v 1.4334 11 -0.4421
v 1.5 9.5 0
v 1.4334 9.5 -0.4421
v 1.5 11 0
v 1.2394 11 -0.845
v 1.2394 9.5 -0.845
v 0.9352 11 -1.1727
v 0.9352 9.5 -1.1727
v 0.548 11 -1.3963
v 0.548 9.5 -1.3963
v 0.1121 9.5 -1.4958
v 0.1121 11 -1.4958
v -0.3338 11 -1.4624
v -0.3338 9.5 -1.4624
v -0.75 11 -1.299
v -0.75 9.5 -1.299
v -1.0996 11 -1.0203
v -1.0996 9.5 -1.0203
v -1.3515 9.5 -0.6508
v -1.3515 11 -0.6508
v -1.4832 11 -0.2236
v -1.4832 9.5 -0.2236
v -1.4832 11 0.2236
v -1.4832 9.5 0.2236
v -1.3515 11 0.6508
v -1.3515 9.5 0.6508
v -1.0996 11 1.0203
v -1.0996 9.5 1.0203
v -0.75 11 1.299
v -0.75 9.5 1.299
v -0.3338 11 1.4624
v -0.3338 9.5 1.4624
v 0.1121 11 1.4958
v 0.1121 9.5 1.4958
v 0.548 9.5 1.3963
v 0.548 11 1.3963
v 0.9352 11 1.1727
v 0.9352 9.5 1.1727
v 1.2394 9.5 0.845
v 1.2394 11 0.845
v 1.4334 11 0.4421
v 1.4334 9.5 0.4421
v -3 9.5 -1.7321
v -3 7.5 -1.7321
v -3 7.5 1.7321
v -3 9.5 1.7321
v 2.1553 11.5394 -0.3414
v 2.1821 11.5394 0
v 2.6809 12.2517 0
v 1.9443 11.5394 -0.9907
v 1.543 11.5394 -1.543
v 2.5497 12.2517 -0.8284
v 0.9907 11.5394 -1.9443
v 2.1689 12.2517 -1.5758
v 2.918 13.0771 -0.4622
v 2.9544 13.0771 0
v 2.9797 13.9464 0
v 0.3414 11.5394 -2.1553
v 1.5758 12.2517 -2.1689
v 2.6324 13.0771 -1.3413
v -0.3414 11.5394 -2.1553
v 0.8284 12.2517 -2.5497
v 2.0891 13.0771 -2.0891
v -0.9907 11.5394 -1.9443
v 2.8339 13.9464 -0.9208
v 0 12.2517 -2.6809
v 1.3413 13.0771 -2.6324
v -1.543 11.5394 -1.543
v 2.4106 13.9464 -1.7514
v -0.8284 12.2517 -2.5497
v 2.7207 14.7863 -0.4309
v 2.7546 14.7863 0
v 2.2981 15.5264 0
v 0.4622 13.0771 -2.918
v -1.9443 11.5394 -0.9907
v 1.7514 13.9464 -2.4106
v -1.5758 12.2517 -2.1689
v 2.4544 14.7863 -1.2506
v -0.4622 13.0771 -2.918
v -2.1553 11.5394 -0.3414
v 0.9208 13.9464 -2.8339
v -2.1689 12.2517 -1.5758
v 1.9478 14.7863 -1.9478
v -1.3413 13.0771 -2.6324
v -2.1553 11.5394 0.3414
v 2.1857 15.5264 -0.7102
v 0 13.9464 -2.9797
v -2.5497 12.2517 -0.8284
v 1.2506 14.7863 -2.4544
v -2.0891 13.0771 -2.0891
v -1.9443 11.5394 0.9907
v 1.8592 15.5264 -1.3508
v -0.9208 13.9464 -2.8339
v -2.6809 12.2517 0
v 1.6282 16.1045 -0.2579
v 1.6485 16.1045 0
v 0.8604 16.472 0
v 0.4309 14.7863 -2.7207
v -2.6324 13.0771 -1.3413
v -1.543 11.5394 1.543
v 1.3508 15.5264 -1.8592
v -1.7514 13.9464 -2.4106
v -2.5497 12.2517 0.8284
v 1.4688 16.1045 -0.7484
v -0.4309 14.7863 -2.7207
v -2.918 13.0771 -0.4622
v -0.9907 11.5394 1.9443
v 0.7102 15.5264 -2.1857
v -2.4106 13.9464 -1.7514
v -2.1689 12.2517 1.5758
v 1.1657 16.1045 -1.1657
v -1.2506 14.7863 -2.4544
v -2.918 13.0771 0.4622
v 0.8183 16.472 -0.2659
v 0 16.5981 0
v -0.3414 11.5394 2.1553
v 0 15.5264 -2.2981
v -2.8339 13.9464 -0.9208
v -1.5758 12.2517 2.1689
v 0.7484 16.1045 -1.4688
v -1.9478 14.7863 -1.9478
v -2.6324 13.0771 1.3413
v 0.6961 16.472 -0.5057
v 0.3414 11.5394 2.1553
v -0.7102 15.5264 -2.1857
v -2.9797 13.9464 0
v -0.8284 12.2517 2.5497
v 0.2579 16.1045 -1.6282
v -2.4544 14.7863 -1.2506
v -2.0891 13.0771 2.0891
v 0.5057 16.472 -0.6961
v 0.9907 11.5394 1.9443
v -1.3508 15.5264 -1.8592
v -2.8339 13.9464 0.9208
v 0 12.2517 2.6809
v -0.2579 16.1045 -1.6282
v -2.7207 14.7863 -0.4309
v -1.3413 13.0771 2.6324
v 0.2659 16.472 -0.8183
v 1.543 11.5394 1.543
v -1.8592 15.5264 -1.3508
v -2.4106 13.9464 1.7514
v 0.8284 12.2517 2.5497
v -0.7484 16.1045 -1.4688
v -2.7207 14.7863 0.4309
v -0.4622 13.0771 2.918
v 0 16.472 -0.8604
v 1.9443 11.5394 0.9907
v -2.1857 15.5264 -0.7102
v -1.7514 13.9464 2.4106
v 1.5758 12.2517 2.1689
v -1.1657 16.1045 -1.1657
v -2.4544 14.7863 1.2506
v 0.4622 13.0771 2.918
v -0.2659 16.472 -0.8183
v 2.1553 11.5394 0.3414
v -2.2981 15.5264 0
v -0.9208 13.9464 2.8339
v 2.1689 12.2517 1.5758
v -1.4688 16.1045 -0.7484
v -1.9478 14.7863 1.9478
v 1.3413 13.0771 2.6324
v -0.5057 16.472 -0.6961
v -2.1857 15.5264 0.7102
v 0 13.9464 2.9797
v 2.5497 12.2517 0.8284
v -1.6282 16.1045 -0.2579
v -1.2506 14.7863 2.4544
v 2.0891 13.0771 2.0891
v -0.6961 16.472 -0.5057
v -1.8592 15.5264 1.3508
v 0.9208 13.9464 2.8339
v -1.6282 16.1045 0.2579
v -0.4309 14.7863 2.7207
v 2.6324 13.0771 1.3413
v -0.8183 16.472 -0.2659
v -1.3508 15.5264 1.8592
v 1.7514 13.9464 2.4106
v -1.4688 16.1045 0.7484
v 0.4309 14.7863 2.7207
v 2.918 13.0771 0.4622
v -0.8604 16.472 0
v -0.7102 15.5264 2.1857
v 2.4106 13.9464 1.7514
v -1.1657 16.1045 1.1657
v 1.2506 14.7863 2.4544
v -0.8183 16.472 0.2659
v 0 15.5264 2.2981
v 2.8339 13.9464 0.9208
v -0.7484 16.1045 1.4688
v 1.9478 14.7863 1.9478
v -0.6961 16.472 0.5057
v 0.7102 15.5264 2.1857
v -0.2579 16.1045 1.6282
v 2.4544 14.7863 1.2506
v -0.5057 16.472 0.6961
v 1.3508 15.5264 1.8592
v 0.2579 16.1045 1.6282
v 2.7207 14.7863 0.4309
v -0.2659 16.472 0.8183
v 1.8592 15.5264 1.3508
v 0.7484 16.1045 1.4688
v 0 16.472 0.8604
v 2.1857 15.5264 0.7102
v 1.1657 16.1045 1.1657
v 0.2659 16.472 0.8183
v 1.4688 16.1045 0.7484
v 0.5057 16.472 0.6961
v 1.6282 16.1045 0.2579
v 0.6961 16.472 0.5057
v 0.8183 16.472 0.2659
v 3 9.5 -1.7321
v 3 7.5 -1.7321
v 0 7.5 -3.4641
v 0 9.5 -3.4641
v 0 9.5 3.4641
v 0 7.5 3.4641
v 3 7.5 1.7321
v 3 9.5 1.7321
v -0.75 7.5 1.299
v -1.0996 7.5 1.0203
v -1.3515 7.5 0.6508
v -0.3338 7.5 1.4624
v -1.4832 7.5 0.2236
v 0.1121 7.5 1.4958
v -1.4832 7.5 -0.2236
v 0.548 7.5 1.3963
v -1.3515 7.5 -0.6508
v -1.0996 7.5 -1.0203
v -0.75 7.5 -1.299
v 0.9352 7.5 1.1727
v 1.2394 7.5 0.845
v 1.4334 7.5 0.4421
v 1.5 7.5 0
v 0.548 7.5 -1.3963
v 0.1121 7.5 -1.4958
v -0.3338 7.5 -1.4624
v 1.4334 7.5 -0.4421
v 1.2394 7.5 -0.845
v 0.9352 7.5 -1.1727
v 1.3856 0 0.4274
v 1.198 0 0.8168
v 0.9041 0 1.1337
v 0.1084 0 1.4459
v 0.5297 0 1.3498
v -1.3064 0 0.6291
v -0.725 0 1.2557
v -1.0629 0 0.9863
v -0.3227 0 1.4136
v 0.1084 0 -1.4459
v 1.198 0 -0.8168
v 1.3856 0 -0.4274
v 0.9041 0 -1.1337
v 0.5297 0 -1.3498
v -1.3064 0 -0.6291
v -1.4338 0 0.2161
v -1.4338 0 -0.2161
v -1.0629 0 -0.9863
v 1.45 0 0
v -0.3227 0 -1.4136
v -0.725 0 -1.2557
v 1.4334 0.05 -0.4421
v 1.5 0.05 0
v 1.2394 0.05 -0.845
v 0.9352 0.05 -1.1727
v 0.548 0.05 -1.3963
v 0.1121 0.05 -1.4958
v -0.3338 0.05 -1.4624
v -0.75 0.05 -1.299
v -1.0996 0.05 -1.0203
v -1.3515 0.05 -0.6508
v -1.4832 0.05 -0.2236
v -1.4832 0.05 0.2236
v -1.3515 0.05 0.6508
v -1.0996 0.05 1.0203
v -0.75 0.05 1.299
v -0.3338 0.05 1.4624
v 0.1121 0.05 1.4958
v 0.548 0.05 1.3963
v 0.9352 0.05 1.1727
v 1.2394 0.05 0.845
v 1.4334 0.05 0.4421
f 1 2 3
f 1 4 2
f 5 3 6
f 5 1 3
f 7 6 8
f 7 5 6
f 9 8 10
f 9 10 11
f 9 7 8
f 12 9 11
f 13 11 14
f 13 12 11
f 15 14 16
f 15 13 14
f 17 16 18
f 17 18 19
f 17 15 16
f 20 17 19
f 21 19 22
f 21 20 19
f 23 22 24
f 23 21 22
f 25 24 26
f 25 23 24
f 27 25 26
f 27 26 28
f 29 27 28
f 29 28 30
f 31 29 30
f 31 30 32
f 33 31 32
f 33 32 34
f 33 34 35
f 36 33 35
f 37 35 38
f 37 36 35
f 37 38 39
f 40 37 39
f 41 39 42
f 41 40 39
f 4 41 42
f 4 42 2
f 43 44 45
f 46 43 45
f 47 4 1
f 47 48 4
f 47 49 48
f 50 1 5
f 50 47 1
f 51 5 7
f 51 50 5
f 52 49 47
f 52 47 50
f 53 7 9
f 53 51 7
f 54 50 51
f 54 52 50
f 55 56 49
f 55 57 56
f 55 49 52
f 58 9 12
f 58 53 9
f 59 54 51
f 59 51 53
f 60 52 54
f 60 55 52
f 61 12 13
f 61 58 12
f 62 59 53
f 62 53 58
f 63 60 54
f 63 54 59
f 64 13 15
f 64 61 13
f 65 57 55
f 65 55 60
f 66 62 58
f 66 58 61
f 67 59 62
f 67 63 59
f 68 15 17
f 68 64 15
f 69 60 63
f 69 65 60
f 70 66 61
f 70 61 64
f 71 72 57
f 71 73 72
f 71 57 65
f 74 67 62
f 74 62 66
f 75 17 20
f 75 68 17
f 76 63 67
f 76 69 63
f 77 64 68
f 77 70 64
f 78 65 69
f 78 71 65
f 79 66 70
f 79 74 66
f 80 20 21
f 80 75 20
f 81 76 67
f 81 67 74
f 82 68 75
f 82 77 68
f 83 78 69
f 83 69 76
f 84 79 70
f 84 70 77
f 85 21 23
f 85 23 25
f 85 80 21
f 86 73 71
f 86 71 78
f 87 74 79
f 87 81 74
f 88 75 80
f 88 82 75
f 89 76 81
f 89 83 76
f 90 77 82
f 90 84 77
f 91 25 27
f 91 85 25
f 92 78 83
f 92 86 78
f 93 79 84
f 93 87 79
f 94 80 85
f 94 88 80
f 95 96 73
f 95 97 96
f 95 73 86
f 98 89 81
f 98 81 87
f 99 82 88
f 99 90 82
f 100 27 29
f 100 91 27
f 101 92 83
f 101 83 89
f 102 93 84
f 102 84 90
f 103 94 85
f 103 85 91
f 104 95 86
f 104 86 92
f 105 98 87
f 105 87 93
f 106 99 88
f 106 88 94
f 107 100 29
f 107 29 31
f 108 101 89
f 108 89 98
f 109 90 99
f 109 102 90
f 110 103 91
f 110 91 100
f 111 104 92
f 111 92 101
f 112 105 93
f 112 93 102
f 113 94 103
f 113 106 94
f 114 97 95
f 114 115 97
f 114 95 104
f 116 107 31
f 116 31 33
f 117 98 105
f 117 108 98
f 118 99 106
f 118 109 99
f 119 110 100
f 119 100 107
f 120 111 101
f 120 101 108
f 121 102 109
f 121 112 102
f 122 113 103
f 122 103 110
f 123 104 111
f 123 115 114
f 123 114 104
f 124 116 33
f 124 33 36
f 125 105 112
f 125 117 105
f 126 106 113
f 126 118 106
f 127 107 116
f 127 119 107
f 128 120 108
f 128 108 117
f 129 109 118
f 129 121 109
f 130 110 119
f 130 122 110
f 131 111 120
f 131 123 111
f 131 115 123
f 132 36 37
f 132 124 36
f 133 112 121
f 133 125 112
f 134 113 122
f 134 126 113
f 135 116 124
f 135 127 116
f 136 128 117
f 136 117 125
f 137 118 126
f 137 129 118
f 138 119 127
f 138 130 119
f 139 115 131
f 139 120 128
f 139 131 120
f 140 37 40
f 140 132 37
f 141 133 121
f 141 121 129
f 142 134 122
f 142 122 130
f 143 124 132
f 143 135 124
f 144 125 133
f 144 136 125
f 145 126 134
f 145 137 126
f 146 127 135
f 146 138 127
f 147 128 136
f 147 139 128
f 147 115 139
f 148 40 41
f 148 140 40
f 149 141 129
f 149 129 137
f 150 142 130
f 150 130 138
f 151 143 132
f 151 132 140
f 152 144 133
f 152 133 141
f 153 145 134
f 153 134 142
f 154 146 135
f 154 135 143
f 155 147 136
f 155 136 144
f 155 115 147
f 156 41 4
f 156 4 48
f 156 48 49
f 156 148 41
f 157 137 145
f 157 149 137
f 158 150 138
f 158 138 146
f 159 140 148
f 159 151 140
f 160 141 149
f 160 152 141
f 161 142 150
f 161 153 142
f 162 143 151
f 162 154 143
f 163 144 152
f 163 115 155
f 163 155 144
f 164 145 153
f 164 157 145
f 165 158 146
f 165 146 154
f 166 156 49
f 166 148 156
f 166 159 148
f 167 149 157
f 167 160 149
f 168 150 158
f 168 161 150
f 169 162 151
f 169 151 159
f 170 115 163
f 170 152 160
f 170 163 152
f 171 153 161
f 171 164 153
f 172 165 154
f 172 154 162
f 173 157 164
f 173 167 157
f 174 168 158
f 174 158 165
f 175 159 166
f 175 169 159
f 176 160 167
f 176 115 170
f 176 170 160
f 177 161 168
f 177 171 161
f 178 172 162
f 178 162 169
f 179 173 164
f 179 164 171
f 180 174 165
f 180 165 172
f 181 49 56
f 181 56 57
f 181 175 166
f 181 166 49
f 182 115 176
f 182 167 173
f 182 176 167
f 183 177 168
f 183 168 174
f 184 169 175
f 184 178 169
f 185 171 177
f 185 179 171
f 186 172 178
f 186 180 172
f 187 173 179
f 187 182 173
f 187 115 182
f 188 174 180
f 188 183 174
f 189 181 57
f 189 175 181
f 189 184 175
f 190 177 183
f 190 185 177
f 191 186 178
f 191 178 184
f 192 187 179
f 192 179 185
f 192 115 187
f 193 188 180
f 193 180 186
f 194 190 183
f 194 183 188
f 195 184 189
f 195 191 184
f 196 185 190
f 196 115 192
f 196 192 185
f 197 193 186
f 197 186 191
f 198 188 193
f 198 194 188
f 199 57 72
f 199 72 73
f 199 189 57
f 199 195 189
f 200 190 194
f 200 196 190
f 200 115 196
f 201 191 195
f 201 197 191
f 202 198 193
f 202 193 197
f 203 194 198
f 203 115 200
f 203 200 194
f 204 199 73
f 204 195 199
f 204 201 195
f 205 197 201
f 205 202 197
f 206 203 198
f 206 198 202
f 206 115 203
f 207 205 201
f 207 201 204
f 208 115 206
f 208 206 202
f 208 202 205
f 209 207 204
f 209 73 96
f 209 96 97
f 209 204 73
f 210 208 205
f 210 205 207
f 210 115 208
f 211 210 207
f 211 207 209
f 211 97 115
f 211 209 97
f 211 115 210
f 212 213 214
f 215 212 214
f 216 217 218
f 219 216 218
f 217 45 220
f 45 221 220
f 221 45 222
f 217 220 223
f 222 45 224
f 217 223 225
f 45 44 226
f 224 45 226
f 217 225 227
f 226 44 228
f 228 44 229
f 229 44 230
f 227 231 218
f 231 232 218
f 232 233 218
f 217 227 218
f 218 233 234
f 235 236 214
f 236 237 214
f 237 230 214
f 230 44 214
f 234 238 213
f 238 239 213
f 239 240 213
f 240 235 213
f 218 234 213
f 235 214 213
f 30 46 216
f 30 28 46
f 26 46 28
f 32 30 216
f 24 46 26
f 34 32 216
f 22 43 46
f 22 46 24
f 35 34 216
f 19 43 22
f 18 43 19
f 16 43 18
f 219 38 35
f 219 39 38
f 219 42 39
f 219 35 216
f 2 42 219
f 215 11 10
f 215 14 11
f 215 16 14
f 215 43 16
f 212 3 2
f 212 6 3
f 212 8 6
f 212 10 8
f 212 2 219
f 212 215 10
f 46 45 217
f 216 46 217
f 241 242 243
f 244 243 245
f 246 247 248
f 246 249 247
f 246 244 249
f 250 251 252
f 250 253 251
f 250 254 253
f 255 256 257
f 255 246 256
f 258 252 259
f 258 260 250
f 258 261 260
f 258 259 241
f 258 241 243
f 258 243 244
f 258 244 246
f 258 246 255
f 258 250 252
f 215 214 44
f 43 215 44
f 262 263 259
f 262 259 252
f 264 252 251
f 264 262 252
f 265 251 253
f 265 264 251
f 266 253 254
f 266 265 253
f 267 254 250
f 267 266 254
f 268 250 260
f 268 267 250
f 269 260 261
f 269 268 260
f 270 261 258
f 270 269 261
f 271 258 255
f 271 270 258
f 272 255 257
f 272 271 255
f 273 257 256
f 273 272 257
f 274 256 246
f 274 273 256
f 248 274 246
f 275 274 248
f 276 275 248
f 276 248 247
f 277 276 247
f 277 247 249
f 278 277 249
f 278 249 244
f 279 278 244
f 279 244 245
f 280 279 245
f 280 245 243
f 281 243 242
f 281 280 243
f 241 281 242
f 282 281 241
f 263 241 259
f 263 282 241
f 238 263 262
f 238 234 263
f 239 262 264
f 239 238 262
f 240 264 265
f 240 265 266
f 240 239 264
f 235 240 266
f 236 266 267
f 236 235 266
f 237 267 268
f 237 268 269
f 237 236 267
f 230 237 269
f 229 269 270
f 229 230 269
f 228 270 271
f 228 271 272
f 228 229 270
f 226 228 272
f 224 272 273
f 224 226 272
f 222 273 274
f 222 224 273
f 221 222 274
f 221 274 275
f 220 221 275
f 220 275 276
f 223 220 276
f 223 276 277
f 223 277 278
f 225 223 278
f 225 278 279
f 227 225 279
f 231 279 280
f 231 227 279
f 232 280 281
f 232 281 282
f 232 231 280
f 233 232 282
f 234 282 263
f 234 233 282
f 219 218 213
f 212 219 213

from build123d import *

# Parameters (mm, degrees)
CHAMFER1_SIZE       = 0.05
SKETCH3_R           = 1.5
BOSS_EXTRUDE1_DEPTH = 2


with BuildPart() as part:
    # Sketch1 → Revolve1 (revolve)
    with BuildSketch(Plane.XY):
        with BuildLine():
            Line((0, 0), (1.5, 0))
            Line((1.5, 0), (1.5, 11))
            ThreePointArc((1.5, 11), (2.897777479, 14.374533347), (0, 16.598076211))
            Line((0, 16.598076211), (0, 0))
        make_face()
    revolve(axis=Axis((0, 0, 0), (0, 1, 0)))

    # Chamfer1
    chamfer1_edges = [part.edges().sort_by_distance(p)[0] for p in [
        (-1.5, 0, 0),
    ]]
    chamfer(chamfer1_edges, length=CHAMFER1_SIZE)

    # Sketch3 → Boss-Extrude1 (add)
    with BuildSketch(Plane(origin=(0, 7.5, 0), x_dir=(1, 0, 0), z_dir=(0, 1, 0))):
        Polygon((3, 1.732050808), (0, 3.464101615), (-3, 1.732050808), (-3, -1.732050808), (0, -3.464101615), (3, -1.732050808), align=None)
        Circle(SKETCH3_R, mode=Mode.SUBTRACT)
    extrude(amount=BOSS_EXTRUDE1_DEPTH)


solid = part.part
